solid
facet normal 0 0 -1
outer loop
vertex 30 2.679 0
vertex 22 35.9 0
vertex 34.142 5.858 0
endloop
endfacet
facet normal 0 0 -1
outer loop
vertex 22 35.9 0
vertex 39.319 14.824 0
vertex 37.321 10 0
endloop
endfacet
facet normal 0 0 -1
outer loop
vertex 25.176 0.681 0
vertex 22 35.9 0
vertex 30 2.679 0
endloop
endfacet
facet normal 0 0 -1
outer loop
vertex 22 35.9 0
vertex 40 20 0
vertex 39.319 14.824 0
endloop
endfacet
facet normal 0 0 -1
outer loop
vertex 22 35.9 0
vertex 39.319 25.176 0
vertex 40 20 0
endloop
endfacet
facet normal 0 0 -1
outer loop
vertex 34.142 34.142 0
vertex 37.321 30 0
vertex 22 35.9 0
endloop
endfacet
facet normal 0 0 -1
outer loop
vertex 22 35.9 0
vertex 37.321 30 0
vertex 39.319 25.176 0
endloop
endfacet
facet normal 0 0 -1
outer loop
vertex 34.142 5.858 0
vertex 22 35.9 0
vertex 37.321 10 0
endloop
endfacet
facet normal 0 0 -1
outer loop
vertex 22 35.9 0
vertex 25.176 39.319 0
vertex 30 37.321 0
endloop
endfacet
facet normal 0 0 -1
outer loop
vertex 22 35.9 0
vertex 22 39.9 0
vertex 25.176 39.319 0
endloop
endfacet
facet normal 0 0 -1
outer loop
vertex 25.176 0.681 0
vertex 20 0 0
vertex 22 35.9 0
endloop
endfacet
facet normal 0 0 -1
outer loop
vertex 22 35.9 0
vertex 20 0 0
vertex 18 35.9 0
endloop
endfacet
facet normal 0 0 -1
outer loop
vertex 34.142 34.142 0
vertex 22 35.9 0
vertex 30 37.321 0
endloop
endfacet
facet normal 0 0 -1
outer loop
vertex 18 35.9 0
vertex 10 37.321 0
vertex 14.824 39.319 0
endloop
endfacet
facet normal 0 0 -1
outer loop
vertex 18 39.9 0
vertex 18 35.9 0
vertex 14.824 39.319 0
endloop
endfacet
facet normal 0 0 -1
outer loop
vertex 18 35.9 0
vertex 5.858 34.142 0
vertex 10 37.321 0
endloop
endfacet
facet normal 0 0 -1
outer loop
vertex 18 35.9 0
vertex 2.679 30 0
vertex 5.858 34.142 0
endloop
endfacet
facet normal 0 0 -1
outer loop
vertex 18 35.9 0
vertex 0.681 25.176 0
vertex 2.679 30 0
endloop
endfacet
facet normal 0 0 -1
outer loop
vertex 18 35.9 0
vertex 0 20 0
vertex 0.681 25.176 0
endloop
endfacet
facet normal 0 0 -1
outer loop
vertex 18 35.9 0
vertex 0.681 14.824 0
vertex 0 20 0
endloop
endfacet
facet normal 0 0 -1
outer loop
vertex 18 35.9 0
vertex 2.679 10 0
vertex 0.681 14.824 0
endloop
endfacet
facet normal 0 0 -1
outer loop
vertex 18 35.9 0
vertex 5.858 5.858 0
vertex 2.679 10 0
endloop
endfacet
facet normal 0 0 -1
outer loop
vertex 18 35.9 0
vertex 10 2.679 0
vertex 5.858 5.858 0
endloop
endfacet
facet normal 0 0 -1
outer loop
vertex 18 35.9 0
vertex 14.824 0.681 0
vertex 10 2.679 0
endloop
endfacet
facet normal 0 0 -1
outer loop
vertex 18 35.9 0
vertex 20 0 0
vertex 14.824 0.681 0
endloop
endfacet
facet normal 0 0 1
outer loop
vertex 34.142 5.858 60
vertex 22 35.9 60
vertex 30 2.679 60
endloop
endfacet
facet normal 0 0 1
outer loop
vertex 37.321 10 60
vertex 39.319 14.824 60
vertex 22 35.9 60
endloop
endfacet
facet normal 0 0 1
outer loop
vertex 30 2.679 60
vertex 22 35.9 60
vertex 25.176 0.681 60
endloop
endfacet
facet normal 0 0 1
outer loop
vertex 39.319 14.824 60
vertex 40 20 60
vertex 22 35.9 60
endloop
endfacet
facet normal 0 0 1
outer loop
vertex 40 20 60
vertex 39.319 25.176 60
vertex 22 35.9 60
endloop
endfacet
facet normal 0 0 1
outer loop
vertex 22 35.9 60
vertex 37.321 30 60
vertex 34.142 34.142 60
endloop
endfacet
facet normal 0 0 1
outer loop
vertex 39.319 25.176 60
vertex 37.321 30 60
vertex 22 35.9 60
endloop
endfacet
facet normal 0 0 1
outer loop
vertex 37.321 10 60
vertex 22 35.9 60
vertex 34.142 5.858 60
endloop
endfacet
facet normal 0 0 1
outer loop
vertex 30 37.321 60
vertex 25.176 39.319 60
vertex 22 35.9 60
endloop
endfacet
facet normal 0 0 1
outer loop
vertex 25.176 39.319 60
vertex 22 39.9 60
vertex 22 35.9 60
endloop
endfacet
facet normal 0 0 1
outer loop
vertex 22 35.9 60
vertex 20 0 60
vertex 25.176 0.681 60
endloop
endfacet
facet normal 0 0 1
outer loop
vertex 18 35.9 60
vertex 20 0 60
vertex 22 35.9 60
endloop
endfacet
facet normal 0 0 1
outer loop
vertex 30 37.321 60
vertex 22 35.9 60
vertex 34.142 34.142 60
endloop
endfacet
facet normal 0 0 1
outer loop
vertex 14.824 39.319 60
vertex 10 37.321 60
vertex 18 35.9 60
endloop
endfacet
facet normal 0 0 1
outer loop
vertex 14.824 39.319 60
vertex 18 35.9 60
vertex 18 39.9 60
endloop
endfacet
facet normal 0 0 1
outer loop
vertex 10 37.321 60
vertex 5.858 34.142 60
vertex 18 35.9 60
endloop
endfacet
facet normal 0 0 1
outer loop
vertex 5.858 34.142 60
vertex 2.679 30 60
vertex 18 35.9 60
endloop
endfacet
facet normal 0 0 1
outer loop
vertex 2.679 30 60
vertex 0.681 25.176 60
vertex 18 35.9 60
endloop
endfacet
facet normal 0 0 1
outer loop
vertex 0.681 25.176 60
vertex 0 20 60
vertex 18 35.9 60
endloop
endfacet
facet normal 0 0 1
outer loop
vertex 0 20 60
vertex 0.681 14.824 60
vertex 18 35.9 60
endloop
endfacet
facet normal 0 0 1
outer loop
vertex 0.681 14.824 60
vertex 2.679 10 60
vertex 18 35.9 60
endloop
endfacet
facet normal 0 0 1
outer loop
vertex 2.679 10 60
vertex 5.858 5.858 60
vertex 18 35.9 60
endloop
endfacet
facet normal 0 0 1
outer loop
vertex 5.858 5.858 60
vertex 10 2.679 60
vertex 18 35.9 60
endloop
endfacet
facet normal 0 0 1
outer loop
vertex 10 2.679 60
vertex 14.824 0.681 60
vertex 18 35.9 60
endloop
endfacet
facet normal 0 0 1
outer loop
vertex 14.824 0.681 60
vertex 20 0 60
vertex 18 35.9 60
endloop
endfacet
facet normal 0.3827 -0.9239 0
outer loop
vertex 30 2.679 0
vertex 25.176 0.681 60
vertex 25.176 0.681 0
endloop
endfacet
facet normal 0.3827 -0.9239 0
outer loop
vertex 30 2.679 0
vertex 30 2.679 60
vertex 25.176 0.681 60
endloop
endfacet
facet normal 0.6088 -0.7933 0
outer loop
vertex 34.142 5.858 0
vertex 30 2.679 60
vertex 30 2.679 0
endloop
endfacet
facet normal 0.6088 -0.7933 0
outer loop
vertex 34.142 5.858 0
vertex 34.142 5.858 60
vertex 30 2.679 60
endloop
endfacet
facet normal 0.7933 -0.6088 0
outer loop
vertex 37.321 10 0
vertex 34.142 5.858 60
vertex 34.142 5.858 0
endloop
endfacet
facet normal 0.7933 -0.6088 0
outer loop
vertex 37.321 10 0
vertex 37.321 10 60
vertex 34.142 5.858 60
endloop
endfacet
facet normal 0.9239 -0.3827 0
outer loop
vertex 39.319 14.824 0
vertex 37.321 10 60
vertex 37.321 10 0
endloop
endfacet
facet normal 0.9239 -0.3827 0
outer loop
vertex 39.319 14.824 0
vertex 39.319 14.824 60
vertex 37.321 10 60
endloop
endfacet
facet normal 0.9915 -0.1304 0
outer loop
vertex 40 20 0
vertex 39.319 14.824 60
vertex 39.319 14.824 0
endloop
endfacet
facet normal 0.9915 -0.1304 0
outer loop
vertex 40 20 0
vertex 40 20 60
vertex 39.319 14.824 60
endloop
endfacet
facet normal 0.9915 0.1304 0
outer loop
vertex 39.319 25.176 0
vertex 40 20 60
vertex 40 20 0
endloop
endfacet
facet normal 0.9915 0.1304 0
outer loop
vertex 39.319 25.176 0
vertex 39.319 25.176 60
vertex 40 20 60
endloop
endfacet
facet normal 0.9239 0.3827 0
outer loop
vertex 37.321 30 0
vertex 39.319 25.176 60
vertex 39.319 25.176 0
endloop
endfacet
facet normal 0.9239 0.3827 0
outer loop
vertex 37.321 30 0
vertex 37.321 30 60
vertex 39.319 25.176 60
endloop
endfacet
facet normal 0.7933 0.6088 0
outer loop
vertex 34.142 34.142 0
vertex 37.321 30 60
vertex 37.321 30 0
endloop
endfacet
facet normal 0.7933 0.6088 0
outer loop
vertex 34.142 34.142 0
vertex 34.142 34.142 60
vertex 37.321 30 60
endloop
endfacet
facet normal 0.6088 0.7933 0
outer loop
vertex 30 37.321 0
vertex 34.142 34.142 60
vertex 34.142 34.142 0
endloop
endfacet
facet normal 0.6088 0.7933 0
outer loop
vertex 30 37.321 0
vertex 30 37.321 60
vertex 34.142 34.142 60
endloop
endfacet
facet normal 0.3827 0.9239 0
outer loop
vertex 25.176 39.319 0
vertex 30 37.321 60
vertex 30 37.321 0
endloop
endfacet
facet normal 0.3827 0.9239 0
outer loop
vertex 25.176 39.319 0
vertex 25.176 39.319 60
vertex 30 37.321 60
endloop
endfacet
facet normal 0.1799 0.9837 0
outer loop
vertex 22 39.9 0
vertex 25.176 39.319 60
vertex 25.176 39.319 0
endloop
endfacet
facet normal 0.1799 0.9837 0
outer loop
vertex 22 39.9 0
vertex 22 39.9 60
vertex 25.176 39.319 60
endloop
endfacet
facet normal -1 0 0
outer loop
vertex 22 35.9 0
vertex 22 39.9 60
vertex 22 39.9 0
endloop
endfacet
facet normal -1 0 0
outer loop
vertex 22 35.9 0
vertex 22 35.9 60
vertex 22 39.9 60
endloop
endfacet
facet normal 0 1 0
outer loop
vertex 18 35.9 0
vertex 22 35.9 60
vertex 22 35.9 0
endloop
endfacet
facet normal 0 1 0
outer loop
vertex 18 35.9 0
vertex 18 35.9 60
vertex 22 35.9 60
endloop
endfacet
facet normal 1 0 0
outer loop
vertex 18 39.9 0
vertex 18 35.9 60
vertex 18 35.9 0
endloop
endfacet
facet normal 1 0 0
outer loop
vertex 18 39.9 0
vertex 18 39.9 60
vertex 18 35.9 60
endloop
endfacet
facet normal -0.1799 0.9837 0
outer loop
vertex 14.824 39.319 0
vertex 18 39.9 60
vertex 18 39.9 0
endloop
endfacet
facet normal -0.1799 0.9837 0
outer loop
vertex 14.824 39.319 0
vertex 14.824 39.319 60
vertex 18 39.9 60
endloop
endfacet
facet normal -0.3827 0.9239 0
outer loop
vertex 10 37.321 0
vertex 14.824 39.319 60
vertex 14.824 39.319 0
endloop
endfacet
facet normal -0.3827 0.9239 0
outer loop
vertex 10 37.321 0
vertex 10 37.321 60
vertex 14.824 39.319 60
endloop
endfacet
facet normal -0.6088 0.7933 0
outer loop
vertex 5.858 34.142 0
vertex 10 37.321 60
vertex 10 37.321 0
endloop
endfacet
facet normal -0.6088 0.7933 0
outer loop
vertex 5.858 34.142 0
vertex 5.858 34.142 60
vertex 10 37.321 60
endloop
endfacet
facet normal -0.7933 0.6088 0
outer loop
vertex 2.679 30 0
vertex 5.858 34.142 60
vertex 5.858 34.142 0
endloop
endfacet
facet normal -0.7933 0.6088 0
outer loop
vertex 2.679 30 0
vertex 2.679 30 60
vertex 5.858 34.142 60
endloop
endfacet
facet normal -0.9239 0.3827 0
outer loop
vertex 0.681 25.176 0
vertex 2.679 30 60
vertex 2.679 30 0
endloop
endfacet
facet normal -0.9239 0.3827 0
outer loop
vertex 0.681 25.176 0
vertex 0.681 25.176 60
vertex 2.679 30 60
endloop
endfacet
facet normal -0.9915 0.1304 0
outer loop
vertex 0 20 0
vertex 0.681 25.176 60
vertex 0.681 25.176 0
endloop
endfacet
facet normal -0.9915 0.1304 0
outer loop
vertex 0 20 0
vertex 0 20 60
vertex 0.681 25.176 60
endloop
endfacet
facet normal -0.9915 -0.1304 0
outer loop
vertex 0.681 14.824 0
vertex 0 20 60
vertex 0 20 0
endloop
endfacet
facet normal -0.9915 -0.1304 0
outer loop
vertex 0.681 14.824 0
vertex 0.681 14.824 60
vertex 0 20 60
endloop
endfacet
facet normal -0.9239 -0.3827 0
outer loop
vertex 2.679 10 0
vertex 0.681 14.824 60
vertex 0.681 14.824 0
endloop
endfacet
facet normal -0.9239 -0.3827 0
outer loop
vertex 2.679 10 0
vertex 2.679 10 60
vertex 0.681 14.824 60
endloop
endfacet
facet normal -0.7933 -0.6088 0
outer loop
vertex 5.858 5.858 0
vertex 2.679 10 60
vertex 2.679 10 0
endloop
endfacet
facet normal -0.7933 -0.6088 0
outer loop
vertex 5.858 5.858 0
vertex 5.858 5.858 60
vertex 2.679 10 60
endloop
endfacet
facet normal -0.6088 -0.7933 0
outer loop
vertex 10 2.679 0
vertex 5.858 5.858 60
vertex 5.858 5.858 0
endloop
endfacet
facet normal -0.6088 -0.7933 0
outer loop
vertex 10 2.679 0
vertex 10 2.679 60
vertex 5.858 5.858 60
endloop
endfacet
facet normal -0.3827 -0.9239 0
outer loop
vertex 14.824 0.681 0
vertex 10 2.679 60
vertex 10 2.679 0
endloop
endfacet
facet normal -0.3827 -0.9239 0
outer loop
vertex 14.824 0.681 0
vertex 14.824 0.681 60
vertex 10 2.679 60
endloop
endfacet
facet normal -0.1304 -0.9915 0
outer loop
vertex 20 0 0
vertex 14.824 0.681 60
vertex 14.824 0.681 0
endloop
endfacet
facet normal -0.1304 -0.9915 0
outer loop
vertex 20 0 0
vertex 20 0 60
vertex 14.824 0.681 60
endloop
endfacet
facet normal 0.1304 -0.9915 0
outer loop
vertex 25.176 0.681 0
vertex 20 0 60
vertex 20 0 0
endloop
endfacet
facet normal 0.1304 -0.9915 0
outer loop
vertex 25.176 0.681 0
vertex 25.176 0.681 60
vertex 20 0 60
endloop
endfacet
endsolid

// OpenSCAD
$fn = 32;

// ----------------------------------------------------------------------
// Keyway shaft: d40 shaft, key 4 x 4 mm
// ----------------------------------------------------------------------

// --- parameters (mm) ---
shaft_r = 20;             // shaft radius
key_w = 4;                // keyway width
key_d = 4;                // keyway depth below the surface line
plate_t = 60;             // shaft length, Z (extrusion height)
fit_tol = 0.05;           // declared fit tolerance (prompt contract)
free_tol = 0.3;           // declared free tolerance (prompt contract)

shaft_d = 2 * shaft_r;  // shaft diameter
circle_step = 15;  // polygon sampling step, degrees

profile = [[14.824, 39.319], [10, 37.321], [5.858, 34.142], [2.679, 30], [0.681, 25.176], [0, 20], [0.681, 14.824], [2.679, 10], [5.858, 5.858], [10, 2.679], [14.824, 0.681], [20, 0], [25.176, 0.681], [30, 2.679], [34.142, 5.858], [37.321, 10], [39.319, 14.824], [40, 20], [39.319, 25.176], [37.321, 30], [34.142, 34.142], [30, 37.321], [25.176, 39.319], [22, 39.9], [22, 35.9], [18, 35.9], [18, 39.9]];  // primary outline, 27 points, counter clockwise

// --- the one profile operation ---
linear_extrude(height = plate_t) polygon(points = profile);
